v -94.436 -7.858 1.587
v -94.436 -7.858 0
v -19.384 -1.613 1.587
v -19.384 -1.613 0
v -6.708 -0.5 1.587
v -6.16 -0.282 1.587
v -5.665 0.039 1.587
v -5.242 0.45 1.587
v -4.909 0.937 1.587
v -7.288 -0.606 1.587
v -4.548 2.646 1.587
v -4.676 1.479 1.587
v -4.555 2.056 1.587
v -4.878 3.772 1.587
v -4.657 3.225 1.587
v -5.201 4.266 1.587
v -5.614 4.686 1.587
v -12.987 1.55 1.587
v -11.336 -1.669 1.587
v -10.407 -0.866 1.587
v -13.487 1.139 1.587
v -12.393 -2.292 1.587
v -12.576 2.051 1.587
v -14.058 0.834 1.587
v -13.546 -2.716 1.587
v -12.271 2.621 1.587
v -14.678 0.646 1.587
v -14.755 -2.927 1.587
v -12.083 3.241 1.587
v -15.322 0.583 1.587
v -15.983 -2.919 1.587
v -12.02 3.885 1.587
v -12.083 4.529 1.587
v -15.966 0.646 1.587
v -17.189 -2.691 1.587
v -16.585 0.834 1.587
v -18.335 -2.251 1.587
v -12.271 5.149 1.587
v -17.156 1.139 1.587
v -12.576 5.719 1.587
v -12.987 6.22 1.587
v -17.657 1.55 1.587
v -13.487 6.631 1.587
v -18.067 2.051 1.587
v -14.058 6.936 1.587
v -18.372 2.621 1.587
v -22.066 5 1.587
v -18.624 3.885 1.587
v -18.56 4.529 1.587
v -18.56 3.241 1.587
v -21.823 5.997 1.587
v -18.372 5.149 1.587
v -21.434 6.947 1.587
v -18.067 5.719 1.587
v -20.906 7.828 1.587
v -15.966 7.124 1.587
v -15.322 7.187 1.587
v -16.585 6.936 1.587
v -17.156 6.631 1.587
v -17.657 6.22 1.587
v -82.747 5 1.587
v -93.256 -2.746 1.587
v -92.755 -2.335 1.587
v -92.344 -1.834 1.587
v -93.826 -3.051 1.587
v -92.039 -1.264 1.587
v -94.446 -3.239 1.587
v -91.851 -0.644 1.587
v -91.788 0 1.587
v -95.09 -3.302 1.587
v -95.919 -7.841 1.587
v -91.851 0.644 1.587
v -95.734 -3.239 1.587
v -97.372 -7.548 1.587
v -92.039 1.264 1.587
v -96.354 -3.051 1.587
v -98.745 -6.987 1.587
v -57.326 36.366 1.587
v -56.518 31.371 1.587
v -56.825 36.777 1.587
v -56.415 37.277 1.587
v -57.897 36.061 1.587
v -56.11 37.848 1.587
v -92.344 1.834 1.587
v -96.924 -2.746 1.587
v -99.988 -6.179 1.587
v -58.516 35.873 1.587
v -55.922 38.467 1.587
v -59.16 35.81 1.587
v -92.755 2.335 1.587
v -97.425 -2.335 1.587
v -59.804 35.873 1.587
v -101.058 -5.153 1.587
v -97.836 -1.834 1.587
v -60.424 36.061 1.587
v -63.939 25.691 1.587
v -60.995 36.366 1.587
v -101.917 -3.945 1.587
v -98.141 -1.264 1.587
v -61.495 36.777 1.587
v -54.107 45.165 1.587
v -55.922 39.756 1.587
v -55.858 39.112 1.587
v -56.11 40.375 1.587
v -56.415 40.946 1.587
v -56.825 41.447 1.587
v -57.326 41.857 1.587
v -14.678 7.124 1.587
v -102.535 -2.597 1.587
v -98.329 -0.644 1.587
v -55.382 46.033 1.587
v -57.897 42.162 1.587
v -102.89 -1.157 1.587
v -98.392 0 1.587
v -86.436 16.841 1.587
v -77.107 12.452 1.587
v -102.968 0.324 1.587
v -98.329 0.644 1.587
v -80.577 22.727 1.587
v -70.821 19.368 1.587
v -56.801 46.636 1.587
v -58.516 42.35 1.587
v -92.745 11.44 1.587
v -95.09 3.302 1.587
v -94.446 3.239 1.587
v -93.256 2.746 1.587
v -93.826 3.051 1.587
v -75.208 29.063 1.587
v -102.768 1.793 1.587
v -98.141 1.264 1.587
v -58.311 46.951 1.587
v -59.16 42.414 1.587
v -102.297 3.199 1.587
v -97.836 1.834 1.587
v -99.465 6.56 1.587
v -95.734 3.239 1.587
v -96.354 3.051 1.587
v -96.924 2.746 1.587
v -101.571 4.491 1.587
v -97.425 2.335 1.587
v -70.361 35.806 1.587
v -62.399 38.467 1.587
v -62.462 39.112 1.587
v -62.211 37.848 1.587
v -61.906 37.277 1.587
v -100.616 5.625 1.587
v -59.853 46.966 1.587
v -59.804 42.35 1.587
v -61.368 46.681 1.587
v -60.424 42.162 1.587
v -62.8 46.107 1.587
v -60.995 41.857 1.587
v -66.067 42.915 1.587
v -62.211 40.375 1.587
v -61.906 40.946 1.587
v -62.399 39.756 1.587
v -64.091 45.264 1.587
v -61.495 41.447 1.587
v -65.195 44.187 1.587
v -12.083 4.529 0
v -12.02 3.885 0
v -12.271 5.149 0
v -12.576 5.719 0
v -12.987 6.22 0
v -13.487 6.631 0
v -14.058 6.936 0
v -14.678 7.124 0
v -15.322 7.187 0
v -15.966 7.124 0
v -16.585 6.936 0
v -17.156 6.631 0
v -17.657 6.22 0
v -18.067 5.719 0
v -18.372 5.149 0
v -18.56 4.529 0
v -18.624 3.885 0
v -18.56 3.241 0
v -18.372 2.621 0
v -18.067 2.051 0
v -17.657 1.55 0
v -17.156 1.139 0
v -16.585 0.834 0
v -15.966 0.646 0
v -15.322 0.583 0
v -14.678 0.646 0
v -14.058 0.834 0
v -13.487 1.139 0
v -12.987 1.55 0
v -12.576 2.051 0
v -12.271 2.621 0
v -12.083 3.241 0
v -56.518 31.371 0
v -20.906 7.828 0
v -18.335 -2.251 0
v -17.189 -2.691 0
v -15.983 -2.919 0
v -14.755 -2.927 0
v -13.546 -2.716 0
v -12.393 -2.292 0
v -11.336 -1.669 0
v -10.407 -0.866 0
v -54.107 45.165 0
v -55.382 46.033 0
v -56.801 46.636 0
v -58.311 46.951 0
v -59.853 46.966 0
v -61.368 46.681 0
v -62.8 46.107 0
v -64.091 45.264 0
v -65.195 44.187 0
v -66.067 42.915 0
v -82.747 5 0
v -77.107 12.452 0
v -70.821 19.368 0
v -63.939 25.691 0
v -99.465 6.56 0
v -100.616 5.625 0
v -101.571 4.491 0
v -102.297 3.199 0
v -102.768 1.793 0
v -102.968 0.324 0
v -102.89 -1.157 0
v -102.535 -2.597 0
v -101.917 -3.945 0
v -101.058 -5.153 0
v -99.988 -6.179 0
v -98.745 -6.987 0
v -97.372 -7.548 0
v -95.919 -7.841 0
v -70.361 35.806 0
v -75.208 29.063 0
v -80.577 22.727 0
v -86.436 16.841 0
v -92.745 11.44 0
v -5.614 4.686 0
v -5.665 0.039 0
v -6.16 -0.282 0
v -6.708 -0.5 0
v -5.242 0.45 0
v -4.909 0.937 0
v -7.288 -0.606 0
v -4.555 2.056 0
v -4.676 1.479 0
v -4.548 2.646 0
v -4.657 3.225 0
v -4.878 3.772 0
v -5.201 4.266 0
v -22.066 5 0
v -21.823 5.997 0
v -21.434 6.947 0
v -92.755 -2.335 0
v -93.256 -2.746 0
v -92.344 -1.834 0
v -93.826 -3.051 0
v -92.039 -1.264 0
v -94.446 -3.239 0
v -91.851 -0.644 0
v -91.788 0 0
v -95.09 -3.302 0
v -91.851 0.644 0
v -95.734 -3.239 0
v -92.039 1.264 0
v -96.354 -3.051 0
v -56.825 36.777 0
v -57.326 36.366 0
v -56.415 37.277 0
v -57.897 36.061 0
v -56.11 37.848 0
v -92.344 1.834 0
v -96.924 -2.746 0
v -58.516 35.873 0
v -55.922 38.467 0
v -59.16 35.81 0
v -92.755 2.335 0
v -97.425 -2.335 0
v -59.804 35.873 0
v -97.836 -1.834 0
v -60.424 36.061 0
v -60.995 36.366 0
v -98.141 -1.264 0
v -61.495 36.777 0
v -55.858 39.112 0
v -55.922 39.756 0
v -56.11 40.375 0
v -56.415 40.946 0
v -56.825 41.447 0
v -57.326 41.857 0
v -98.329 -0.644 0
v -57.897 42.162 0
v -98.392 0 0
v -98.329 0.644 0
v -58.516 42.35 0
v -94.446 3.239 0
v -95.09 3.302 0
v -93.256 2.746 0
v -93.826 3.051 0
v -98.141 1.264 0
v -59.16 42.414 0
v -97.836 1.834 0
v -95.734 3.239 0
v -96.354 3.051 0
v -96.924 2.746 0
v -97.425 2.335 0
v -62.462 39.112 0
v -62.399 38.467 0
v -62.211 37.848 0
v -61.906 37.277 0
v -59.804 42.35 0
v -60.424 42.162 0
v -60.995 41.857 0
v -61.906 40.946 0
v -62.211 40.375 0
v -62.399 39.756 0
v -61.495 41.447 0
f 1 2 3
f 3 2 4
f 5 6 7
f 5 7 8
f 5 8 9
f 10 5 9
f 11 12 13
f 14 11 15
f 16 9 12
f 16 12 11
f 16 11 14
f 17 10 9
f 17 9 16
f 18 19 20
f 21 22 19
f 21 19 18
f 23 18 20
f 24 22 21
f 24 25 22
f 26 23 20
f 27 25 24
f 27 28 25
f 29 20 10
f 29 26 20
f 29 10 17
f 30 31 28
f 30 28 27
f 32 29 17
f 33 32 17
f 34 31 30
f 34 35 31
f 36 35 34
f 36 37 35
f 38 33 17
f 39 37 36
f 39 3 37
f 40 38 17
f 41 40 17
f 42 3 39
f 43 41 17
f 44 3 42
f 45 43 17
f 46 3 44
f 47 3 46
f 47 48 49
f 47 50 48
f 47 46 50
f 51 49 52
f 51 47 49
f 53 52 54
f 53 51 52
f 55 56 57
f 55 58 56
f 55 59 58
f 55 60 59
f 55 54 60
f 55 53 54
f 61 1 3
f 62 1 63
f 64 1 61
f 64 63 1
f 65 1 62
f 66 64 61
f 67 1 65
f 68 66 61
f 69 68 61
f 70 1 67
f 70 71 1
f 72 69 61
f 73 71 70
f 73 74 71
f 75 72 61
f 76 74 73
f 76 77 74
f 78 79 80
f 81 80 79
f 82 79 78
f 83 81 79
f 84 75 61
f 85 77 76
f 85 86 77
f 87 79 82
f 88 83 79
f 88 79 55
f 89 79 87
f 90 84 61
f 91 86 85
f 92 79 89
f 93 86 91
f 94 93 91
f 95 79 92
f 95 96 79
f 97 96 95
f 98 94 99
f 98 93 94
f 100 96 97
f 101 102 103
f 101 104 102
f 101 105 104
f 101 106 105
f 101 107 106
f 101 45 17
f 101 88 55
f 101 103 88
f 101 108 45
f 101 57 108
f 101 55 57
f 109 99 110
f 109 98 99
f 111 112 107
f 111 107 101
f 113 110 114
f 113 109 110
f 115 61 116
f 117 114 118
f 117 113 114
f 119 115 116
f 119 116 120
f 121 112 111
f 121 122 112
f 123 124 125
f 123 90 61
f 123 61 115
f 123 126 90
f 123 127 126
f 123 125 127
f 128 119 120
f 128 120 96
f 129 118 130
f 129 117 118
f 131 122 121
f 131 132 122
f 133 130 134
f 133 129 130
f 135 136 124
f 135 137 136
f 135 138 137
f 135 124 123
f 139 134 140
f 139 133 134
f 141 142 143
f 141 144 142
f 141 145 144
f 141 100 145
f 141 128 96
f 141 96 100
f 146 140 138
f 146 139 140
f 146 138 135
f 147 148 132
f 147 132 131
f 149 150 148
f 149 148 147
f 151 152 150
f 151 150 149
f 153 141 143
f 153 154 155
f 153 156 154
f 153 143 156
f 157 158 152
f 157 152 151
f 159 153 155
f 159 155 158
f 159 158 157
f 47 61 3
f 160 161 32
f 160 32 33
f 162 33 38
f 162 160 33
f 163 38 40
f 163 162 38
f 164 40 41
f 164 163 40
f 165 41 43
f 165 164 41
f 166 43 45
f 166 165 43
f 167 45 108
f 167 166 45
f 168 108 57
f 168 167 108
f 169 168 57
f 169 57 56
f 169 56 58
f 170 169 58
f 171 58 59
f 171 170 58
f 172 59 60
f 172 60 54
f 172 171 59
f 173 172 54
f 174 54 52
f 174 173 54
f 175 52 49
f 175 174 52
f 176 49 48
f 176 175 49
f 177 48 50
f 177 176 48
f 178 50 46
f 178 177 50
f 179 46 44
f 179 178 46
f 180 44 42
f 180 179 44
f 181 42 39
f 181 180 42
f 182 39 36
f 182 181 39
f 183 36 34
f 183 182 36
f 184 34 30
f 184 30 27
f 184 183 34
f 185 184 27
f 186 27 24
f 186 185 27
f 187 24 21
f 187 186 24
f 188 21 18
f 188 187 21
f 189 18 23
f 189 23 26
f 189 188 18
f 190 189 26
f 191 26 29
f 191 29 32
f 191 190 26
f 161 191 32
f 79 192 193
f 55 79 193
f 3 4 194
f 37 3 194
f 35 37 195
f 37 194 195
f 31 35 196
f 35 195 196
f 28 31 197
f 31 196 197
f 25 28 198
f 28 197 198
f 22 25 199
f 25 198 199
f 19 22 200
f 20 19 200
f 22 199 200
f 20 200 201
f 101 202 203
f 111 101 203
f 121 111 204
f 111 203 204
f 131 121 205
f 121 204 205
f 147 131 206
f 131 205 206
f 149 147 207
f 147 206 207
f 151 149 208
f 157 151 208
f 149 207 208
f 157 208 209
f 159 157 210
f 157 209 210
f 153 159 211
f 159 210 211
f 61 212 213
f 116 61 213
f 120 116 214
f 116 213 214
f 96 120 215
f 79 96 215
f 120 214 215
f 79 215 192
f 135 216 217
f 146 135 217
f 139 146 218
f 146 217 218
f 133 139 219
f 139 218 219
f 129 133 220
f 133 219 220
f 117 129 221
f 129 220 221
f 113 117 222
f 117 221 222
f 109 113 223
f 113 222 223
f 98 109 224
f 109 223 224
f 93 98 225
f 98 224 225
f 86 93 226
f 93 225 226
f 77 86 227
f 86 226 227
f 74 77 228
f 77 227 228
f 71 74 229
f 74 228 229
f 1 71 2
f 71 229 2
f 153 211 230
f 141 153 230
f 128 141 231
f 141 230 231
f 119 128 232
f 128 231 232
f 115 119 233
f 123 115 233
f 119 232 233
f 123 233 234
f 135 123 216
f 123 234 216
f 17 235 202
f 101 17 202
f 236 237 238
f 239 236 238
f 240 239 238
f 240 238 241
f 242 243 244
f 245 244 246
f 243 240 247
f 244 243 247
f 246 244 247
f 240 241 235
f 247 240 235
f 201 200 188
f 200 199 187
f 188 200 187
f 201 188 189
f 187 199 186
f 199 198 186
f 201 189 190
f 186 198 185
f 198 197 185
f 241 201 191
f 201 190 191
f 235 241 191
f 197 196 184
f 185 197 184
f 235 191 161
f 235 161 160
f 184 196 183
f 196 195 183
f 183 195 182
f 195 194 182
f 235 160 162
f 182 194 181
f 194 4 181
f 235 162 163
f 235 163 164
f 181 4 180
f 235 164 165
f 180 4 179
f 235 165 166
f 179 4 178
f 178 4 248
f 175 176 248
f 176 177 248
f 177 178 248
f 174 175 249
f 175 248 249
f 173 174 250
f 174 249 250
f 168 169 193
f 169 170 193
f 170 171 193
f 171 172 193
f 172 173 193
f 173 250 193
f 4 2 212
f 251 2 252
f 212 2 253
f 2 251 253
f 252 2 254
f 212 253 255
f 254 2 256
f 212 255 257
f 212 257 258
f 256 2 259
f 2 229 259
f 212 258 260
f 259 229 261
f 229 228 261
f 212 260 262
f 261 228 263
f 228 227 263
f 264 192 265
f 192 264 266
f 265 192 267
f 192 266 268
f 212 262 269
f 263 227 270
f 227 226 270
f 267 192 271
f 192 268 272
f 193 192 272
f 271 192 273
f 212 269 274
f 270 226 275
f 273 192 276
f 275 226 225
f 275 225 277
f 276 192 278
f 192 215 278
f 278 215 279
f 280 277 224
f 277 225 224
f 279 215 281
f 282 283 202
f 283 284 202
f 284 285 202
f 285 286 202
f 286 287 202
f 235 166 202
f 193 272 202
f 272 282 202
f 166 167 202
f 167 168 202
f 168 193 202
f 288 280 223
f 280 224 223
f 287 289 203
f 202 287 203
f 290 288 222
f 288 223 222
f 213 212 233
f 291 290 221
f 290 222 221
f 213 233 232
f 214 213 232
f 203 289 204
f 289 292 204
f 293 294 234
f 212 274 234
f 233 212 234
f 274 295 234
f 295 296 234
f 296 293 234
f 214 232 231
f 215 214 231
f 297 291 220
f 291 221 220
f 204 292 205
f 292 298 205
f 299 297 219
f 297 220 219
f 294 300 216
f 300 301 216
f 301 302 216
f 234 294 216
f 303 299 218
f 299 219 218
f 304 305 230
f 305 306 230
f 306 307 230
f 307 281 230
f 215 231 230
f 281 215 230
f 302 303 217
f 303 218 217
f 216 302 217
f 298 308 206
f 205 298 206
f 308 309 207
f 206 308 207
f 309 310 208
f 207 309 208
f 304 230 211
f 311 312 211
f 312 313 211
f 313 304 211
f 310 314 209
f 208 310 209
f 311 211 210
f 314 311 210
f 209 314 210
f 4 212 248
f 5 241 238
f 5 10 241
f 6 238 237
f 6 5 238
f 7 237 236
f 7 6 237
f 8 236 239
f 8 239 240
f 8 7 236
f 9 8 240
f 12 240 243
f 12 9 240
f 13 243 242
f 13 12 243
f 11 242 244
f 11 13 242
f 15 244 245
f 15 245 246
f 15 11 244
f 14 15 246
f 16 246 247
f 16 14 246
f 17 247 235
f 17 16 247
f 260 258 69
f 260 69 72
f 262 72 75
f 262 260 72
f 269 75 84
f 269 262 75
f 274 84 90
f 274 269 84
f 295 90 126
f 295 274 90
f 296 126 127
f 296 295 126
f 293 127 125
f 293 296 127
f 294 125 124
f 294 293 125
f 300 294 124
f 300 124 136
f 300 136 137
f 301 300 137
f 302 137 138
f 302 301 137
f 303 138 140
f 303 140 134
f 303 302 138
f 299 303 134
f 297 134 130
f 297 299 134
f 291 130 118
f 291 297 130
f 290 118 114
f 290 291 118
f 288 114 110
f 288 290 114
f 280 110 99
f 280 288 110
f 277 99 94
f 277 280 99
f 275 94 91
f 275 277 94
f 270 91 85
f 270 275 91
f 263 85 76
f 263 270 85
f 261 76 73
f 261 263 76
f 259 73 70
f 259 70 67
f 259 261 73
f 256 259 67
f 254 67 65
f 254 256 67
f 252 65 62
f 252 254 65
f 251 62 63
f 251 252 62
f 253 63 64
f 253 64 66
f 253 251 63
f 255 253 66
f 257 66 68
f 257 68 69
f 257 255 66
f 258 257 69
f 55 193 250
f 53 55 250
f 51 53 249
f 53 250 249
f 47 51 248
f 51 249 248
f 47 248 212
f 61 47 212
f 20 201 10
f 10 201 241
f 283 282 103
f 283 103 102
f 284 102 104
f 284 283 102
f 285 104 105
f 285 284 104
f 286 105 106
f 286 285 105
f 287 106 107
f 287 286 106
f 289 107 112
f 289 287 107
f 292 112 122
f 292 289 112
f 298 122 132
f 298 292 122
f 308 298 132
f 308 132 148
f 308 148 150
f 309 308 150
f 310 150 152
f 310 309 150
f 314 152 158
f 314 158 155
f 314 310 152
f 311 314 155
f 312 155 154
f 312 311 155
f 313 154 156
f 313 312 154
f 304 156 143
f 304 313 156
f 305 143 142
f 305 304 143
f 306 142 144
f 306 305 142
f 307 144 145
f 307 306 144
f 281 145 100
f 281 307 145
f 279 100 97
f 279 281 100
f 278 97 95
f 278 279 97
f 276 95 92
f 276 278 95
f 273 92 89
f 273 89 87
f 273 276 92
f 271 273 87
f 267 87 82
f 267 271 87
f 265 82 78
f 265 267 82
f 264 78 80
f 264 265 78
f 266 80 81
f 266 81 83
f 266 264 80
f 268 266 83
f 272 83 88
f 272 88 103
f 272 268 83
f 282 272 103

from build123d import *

# Parameters (mm, degrees)
ESQUISSE1_R        = 3.302
BOSS_EXTRU_2_DEPTH = 1.587
CONG_1_R           = 3


with BuildPart() as part:
    # Esquisse1 → Boss.-Extru.2 (new body)
    with BuildSketch(Plane(origin=(0, 0, 0), x_dir=(0, 1, 0), z_dir=(0, 0, 1))):
        with BuildLine():
            Line((-0.865912697, 10.406603399), (0, 0))
            Line((0, 0), (45.164905045, 54.107342637))
            ThreePointArc((45.164905045, 54.107342637), (46.860747383, 60.617730495), (42.915369181, 66.067044408))
            ThreePointArc((42.915369181, 66.067044408), (22.727341061, 80.577470806), (6.560094465, 99.464744063))
            ThreePointArc((6.560094465, 99.464744063), (-2.596669453, 102.535168417), (-7.857844745, 94.436164423))
            Line((-7.857844745, 94.436164423), (-1.612927072, 19.384277892))
            ThreePointArc((-1.612927072, 19.384277892), (-2.927440017, 14.754983859), (-0.865912697, 10.406603399))
        make_face()
        with Locations(Location((3.885, 15.321833395, 0), (0, 0, 270))):
            Circle(ESQUISSE1_R, mode=Mode.SUBTRACT)
        with BuildLine():
            Line((5, 22.066270538), (5, 82.747179925))
            ThreePointArc((5, 82.747179925), (19.367518455, 70.82097994), (31.370848456, 56.517836875))
            Line((31.370848456, 56.517836875), (7.827581381, 20.90633959))
            ThreePointArc((7.827581381, 20.90633959), (6.479444508, 21.646350379), (5, 22.066270538))
        make_face(mode=Mode.SUBTRACT)
        with Locations(Location((0, 95.09, 0), (0, 0, 270))):
            Circle(ESQUISSE1_R, mode=Mode.SUBTRACT)
        with Locations(Location((39.111633766, 59.160176675, 0), (0, 0, 270))):
            Circle(ESQUISSE1_R, mode=Mode.SUBTRACT)
    extrude(amount=BOSS_EXTRU_2_DEPTH)

    # Congé1
    cong_1_edges = [part.edges().sort_by_distance(p)[0] for p in [
        (0, 0, 0.7935),
    ]]
    fillet(cong_1_edges, radius=CONG_1_R)


solid = part.part
